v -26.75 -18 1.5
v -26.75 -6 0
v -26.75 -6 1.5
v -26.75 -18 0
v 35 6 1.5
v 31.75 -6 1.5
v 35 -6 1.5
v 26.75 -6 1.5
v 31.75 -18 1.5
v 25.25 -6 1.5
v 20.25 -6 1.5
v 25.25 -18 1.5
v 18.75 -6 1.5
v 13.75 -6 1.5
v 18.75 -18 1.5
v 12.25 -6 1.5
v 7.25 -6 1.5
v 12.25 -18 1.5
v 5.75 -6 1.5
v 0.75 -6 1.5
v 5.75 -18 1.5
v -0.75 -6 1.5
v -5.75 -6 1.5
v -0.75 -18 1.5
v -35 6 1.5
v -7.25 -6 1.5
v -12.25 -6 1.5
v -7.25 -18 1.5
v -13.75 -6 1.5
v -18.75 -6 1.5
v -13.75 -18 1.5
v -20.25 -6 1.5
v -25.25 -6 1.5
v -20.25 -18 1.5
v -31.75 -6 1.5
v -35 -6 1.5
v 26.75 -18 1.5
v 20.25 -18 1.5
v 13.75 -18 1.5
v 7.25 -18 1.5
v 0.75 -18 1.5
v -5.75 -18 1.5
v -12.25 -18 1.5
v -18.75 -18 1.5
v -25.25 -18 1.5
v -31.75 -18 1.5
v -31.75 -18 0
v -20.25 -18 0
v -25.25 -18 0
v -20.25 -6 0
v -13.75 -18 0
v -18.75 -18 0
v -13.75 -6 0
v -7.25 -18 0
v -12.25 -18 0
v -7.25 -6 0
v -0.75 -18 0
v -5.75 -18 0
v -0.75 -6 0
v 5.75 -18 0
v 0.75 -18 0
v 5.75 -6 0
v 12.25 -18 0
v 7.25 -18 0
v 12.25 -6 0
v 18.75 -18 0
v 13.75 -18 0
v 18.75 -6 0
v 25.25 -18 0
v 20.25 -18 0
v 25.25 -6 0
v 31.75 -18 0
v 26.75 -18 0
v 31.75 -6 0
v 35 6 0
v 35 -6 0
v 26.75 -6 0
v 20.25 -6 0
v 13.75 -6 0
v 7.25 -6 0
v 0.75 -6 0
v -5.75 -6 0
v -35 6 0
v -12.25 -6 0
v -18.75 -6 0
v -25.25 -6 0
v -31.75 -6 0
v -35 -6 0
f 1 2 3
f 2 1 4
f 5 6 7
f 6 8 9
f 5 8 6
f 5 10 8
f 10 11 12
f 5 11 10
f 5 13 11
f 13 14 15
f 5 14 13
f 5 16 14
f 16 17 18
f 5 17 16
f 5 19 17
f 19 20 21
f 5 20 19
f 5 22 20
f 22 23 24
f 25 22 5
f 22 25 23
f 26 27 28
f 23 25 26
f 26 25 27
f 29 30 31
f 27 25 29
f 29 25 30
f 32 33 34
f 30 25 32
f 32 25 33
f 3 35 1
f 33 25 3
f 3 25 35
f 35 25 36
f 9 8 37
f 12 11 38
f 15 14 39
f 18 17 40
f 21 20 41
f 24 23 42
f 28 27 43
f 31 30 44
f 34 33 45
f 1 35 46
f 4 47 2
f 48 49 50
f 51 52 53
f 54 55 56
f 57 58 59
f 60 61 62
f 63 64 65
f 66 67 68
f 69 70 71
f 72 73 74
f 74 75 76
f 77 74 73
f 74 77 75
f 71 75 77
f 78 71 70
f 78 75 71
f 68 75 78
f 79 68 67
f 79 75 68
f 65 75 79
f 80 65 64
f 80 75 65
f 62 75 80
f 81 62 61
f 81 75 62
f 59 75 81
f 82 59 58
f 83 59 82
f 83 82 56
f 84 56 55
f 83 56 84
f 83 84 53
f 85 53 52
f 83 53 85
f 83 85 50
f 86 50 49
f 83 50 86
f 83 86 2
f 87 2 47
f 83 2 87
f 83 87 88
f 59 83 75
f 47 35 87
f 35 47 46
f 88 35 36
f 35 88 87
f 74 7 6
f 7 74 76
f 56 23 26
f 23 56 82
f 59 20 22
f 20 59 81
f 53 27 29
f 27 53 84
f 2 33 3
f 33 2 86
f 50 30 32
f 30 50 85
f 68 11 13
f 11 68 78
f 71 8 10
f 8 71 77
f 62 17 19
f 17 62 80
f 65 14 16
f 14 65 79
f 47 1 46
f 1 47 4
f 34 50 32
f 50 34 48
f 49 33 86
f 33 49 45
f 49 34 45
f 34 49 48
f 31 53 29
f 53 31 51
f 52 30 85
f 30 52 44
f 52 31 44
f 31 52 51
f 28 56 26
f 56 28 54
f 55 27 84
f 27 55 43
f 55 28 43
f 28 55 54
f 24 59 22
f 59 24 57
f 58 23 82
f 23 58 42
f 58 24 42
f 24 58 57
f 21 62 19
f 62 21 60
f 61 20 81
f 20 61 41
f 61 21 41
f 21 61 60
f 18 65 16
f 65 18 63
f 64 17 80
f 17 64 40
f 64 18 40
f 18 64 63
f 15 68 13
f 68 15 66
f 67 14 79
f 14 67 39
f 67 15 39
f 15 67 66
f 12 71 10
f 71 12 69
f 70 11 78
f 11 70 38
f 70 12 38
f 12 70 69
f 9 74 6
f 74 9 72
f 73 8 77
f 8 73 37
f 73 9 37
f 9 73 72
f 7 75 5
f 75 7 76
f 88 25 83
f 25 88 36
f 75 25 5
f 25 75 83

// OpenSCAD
// 10-well agarose gel comb
// Designed for FDM printing, lying flat on the XY plane.

// --- Dimensions ---
spine_l     = 70.0;    // Length of the spine (X)
spine_w     = 12.0;    // Width of the spine (Y)
plate_t     = 1.5;     // Thickness of the plate (Z)
tooth_w     = 5.0;     // Width of each tooth (X)
tooth_l     = 12.0;    // Length of each tooth (Y)
gap         = 1.5;     // Gap between teeth
num_teeth   = 10;      // Number of teeth

$fn = 64;

// --- Calculations ---
// Total width of the teeth array (from start of first tooth to end of last)
total_teeth_x = (num_teeth * tooth_w) + ((num_teeth - 1) * gap);

// The teeth array is centered on X=0. 
// The first tooth starts at -(total_teeth_x / 2).
x_start = -total_teeth_x / 2;

// The spine is centered on Y=0, so its edges are at +/- spine_w/2.
// One long edge is at Y = -spine_w/2.
// To "hang" in the -Y direction from that edge, the teeth 
// occupy the space from Y = (-spine_w/2 - tooth_l) to Y = -spine_w/2.
y_tooth_start = -spine_w/2 - tooth_l;

union() {
    // Main Body: The spine
    // Centered on X and Y, sitting on Z=0
    translate([-spine_l/2, -spine_w/2, 0])
        cube([spine_l, spine_w, plate_t]);
    
    // The Teeth
    for (i = [0 : num_teeth - 1]) {
        // X position: start at x_start and increment by (width + gap)
        tx = x_start + (i * (tooth_w + gap));
        
        // Translate to position:
        // X: Centered array
        // Y: From the edge of the spine extending in -Y direction
        // Z: Sitting on the bed
        translate([tx, y_tooth_start, 0])
            cube([tooth_w, tooth_l, plate_t]);
    }
}
